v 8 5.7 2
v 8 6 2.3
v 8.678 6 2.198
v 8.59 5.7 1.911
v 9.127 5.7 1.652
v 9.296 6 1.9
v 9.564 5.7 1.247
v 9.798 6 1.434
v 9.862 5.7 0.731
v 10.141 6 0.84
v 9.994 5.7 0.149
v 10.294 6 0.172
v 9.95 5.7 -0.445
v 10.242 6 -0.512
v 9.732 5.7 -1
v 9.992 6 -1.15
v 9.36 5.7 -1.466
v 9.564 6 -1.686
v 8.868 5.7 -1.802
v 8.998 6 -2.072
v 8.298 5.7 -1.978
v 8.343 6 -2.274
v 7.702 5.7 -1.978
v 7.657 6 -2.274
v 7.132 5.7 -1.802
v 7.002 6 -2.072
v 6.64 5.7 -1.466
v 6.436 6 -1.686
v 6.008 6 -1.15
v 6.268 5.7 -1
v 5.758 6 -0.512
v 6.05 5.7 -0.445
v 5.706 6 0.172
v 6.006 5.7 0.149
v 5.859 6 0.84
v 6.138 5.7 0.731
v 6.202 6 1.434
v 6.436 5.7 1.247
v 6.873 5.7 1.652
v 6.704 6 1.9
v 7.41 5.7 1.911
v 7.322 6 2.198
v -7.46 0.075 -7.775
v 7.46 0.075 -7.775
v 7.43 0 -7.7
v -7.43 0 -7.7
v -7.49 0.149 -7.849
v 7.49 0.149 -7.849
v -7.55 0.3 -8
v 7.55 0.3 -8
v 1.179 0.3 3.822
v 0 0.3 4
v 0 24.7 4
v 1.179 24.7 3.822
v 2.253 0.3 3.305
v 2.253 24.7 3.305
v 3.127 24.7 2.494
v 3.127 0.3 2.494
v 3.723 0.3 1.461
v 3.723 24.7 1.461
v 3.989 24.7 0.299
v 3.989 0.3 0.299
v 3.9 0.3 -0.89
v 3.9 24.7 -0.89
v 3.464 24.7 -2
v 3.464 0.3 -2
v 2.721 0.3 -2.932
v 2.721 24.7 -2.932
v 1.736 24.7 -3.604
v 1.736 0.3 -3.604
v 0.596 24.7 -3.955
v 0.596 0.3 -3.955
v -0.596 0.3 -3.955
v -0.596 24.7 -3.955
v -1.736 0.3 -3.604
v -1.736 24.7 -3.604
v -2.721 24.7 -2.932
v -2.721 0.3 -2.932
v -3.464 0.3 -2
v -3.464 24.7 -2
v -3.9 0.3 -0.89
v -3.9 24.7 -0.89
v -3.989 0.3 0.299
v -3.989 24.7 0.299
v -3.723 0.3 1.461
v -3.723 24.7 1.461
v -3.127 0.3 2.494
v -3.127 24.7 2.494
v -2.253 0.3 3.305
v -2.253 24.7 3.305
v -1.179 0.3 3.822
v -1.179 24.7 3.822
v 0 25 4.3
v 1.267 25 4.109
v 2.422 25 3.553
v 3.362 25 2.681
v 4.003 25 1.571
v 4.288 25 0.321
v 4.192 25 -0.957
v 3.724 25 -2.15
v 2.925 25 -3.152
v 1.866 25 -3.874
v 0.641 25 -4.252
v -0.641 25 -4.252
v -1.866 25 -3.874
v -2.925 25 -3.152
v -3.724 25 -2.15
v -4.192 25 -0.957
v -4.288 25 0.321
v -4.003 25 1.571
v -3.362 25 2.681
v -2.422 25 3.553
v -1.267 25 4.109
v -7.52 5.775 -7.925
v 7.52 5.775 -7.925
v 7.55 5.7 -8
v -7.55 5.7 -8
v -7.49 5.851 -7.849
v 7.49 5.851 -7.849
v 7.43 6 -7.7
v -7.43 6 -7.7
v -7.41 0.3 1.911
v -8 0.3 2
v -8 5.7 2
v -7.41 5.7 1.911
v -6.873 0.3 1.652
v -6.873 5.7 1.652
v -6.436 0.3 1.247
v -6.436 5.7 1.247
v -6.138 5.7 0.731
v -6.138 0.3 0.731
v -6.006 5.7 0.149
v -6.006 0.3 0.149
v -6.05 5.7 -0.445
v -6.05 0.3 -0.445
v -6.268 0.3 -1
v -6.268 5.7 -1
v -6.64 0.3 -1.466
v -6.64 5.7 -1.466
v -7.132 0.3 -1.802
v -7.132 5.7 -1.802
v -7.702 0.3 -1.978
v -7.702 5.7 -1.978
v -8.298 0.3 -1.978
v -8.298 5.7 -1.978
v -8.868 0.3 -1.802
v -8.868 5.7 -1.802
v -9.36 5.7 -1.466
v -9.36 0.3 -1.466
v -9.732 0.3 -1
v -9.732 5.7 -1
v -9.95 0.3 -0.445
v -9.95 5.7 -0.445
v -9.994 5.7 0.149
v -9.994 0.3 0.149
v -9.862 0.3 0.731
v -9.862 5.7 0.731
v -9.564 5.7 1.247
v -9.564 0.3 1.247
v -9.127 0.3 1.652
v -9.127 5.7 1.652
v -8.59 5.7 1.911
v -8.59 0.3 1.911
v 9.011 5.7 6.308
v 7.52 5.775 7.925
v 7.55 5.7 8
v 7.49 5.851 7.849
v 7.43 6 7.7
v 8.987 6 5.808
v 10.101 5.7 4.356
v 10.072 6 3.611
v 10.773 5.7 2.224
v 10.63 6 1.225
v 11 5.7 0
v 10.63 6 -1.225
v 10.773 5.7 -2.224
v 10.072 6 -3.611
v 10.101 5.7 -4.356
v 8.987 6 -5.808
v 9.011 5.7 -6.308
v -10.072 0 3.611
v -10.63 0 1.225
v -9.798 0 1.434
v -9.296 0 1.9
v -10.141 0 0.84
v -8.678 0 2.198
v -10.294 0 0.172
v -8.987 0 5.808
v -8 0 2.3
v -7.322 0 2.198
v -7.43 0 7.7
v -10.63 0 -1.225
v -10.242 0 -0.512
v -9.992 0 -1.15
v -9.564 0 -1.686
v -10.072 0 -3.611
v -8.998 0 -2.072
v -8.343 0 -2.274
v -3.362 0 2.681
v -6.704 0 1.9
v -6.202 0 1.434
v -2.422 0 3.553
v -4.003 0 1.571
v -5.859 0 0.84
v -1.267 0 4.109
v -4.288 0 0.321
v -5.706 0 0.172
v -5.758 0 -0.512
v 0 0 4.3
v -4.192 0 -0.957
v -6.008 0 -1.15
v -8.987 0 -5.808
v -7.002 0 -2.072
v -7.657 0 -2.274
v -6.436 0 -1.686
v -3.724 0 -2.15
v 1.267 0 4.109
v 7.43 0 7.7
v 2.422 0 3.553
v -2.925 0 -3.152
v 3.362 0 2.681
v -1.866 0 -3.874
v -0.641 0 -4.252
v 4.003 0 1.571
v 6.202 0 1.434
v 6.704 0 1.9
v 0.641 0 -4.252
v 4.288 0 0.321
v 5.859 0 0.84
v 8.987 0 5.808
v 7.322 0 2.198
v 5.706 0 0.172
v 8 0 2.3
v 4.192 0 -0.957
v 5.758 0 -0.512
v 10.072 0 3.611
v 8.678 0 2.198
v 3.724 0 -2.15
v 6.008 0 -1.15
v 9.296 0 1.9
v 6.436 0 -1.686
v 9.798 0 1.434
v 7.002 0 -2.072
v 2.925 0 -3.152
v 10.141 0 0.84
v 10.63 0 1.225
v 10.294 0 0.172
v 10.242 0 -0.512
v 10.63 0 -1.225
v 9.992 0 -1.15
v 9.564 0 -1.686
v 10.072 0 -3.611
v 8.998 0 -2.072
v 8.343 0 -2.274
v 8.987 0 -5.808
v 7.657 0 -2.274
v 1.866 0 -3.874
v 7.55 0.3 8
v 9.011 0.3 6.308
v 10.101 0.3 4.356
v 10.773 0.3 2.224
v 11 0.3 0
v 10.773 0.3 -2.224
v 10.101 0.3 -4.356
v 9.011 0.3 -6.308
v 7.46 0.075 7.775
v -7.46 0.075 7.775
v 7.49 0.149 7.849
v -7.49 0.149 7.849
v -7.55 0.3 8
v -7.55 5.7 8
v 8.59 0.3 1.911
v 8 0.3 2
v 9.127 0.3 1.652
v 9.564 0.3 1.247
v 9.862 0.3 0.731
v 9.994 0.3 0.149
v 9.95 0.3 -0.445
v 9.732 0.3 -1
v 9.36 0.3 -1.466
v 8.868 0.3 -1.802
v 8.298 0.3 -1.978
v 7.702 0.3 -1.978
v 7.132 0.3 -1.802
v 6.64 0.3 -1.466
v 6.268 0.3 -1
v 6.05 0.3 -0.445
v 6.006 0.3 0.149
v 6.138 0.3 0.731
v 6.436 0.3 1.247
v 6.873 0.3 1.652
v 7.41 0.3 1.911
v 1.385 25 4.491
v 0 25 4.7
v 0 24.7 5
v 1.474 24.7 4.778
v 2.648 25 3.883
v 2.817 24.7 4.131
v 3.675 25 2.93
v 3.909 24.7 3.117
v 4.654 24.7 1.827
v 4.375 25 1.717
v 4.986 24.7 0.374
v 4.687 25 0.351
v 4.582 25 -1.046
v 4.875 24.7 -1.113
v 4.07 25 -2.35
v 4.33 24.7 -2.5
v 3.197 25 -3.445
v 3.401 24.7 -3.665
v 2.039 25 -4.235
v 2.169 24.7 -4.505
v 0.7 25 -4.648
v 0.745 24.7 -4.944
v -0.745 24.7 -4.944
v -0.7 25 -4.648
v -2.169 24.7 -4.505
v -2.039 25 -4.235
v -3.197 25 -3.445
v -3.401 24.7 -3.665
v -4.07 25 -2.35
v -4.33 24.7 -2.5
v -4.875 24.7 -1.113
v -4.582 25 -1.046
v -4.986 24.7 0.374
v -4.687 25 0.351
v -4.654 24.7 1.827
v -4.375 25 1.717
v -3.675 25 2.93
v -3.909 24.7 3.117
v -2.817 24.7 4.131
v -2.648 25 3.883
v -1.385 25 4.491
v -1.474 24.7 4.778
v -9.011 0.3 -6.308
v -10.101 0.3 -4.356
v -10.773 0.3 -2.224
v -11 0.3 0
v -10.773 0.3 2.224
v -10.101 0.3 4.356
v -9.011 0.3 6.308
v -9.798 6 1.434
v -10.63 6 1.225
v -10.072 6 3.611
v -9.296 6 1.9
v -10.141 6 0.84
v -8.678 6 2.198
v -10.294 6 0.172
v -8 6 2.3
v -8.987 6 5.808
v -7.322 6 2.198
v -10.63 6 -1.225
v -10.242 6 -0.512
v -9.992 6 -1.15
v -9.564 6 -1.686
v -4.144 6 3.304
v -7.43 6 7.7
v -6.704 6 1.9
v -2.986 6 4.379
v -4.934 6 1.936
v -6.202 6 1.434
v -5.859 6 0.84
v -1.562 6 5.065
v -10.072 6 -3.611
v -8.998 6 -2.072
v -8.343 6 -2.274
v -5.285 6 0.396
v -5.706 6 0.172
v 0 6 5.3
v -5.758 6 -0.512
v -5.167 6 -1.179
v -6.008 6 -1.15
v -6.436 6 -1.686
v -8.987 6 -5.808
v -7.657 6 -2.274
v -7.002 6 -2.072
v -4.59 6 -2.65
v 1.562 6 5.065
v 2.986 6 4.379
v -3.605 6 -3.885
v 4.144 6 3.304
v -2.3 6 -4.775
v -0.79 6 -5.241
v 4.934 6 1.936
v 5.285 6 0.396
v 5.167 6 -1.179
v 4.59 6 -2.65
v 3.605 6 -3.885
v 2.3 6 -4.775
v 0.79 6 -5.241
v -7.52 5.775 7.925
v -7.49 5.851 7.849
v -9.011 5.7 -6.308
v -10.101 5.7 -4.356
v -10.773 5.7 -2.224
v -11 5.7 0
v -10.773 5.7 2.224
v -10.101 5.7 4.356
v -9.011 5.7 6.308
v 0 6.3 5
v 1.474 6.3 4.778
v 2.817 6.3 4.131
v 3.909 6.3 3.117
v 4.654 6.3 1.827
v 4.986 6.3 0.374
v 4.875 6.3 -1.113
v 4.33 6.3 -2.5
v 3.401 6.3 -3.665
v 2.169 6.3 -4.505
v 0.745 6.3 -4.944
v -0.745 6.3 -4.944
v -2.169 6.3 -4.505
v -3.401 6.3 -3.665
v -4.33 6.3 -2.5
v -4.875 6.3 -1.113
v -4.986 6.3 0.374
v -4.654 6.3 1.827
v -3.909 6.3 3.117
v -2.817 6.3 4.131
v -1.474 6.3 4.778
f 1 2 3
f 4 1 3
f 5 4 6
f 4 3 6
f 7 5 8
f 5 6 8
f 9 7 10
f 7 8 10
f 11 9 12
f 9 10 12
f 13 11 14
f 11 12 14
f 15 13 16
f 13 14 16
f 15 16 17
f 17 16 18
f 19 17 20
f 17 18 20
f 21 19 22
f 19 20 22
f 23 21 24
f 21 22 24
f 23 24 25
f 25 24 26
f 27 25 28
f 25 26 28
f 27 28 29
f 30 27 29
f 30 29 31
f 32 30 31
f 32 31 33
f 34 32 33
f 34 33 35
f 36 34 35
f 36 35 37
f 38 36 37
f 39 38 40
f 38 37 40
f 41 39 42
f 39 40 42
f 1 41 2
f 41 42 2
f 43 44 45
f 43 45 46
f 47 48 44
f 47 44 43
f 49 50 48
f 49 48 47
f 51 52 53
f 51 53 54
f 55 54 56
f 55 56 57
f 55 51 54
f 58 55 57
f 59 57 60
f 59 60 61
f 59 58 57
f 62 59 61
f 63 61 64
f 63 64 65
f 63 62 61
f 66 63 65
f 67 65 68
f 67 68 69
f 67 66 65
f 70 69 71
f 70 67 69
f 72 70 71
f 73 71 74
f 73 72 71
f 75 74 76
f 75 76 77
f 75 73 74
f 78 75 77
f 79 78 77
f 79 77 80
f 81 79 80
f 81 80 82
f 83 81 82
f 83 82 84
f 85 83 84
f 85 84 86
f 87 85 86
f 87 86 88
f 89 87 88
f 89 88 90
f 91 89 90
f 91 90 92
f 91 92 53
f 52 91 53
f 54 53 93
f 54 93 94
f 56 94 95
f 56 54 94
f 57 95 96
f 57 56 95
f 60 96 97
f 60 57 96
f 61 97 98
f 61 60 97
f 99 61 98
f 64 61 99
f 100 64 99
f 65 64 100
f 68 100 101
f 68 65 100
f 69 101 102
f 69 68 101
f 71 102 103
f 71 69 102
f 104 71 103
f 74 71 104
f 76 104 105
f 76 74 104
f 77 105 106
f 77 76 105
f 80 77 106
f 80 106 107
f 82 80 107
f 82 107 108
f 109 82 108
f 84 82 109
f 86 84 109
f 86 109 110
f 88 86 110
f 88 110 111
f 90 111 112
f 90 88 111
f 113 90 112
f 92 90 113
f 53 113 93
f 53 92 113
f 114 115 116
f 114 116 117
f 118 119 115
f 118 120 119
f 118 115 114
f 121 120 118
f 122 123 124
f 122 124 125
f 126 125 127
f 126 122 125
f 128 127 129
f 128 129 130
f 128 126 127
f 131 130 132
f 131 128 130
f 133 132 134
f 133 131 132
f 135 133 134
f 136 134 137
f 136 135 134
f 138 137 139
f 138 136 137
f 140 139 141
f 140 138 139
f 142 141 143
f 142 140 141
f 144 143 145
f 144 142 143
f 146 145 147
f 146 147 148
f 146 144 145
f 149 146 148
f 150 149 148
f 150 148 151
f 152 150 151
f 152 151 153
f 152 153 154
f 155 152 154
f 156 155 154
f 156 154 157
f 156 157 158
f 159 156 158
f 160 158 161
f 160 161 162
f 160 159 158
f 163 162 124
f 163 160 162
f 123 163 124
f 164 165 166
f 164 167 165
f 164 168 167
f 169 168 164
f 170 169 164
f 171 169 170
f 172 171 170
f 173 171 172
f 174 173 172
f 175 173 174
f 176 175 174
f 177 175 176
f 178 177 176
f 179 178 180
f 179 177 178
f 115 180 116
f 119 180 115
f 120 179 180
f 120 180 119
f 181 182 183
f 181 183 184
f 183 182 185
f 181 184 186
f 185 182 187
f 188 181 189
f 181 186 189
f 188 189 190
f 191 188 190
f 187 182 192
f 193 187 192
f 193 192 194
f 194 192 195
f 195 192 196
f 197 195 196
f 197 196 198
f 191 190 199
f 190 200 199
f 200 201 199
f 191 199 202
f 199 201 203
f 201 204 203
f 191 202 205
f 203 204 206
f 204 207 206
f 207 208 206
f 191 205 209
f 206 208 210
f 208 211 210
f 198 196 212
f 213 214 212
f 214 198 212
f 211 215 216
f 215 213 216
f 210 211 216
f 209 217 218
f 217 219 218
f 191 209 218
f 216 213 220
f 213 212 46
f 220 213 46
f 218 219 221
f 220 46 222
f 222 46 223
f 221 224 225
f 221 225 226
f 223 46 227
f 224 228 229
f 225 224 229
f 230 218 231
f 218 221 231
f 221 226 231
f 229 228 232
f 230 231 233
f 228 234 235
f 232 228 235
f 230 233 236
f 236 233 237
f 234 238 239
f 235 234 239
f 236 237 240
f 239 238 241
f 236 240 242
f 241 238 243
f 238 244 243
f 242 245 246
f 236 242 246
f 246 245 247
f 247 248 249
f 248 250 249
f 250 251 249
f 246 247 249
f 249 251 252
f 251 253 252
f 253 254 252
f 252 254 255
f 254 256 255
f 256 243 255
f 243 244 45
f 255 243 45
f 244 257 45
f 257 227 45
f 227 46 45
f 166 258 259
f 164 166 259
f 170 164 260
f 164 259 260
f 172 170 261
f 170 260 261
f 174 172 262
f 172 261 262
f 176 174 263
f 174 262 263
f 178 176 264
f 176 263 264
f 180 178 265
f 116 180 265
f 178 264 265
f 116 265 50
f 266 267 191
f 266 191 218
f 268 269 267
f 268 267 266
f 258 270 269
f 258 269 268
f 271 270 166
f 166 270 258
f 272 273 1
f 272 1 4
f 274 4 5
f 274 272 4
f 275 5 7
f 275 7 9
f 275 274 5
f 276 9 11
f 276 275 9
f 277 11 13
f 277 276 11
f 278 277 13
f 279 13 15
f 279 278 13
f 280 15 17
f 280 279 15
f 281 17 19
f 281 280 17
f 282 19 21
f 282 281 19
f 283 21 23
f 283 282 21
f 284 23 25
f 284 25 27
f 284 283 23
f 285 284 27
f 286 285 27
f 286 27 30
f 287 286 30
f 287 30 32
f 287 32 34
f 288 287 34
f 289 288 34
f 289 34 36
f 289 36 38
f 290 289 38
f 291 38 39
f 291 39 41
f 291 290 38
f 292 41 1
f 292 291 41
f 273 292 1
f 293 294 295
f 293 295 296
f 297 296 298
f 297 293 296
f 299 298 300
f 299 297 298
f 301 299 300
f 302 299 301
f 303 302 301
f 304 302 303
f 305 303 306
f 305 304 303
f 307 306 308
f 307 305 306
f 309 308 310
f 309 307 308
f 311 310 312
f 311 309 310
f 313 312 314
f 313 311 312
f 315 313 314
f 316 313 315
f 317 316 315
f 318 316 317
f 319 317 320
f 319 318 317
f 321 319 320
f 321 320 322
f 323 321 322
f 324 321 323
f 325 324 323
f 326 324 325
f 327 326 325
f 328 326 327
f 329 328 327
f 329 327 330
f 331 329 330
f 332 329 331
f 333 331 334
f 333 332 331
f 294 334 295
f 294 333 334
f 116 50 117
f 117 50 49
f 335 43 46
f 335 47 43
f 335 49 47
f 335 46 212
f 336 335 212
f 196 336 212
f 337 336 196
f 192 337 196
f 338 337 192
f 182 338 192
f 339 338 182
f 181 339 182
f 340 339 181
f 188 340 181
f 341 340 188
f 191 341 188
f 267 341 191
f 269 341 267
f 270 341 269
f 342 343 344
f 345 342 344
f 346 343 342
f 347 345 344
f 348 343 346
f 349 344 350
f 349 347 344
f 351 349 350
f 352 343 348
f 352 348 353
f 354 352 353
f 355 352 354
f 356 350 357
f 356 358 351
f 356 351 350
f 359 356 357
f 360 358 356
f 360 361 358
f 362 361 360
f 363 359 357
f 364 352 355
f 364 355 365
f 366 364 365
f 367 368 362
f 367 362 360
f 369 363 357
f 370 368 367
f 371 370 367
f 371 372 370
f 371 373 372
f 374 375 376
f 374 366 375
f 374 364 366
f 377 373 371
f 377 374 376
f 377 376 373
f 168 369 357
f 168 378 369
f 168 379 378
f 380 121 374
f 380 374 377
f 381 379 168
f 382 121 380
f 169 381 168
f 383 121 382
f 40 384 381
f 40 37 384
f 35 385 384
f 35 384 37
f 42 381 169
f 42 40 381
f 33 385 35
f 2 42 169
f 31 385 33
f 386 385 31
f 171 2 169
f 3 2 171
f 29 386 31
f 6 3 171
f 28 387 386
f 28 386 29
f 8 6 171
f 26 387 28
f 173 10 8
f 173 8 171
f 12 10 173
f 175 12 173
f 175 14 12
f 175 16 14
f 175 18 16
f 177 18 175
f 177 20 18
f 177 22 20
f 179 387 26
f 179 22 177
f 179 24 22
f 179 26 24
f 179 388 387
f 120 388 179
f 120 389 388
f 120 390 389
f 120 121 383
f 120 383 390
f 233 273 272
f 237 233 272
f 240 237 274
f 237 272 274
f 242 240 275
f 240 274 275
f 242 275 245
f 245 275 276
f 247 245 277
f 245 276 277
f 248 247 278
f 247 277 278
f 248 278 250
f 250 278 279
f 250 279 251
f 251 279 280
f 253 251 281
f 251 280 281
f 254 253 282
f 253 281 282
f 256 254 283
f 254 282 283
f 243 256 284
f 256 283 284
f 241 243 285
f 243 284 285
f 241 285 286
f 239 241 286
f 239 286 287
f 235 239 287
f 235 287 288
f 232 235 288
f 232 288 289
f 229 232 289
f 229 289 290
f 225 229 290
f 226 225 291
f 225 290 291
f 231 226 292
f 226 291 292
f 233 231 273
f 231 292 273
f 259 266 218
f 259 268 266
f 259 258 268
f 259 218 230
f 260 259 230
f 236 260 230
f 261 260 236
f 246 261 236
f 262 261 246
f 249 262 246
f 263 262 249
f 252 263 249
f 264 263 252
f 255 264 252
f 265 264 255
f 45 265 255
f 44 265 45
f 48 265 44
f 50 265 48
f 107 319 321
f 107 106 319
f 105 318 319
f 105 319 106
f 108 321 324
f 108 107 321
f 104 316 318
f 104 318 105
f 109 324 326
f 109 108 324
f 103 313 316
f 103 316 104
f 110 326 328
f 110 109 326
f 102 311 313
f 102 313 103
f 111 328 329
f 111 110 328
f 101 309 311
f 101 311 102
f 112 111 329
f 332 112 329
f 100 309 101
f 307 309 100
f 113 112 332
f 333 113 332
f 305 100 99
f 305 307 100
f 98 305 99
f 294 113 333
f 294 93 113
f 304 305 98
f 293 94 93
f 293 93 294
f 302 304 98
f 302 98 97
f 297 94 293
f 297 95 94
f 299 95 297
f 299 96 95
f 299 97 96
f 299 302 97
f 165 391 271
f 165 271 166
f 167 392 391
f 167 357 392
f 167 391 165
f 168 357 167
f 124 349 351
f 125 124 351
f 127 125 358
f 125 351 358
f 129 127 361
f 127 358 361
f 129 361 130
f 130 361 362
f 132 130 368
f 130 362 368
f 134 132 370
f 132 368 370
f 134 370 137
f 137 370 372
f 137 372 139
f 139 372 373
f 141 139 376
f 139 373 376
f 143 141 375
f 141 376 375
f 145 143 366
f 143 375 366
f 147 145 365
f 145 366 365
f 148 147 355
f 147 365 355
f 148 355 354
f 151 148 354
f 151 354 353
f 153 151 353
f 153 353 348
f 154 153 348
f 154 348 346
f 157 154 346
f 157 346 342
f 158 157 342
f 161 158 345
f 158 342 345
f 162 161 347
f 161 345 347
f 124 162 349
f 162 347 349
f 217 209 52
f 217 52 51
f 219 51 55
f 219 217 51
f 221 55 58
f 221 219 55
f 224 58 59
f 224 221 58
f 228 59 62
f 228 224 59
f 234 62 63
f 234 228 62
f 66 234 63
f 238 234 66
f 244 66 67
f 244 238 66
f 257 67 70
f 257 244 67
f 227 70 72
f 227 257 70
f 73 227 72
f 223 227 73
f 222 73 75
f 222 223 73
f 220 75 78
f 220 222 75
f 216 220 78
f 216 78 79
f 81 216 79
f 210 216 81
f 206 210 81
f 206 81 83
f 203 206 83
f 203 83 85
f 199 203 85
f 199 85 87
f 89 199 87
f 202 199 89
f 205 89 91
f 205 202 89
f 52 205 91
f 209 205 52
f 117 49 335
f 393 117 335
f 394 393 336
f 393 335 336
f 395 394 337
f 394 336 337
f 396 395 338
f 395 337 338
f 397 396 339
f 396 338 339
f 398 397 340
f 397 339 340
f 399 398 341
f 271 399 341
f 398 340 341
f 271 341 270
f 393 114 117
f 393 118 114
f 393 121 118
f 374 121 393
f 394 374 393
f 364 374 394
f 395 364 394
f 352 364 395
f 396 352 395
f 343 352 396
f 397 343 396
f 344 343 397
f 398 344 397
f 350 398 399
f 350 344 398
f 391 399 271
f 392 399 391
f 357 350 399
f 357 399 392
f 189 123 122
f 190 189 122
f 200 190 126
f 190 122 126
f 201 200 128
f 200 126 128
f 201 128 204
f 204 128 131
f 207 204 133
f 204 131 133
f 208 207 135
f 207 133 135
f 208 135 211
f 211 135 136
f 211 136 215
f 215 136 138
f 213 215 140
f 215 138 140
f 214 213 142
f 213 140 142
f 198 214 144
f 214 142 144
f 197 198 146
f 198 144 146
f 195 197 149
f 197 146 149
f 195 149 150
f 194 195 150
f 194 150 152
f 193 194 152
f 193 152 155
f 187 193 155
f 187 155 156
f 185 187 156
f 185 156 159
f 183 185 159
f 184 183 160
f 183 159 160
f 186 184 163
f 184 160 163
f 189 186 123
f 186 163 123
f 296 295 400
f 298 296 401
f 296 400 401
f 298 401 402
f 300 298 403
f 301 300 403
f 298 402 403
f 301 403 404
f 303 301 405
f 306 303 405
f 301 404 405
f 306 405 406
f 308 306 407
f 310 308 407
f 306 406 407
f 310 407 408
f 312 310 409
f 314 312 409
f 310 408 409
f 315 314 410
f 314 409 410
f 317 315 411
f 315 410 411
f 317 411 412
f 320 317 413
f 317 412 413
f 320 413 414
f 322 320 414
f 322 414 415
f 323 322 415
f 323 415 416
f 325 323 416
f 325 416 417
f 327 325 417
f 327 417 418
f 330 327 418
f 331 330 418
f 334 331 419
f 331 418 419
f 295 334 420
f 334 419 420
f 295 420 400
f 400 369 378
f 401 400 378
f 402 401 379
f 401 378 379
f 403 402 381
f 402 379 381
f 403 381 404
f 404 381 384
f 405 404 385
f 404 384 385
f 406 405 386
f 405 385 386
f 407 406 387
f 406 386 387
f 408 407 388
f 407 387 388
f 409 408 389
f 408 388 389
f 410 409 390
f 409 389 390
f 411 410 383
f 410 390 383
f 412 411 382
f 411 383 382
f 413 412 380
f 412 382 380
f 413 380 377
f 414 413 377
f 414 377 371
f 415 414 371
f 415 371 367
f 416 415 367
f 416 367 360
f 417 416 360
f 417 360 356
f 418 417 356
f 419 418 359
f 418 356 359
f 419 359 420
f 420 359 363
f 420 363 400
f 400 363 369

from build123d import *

# Parameters (mm, degrees)
CROQUIS1_R              = 4
CROQUIS1_R_2            = 2
SALIENTE_EXTRUIR1_DEPTH = 6
CROQUIS2_R              = 5
CROQUIS2_R_2            = 4
SALIENTE_EXTRUIR2_DEPTH = 19
CHAFL_N1_SIZE           = 0.3


with BuildPart() as part:
    # Croquis1 → Saliente-Extruir1 (new body)
    with BuildSketch(Plane(origin=(0, 0, 0), x_dir=(1, 0, 0), z_dir=(0, 1, 0))):
        with BuildLine():
            Line((7.549834435, 8), (-7.549834435, 8))
            ThreePointArc((-7.549834435, 8), (-11, 0), (-7.549834435, -8))
            Line((-7.549834435, -8), (7.549834435, -8))
            ThreePointArc((7.549834435, -8), (11, 0), (7.549834435, 8))
        make_face()
        with Locations(Location((0, 0, 0), (0, 0, 270))):
            Circle(CROQUIS1_R, mode=Mode.SUBTRACT)
        with Locations(Location((-8, 0, 0), (0, 0, 270))):
            Circle(CROQUIS1_R_2, mode=Mode.SUBTRACT)
        with Locations(Location((8, 0, 0), (0, 0, 270))):
            Circle(CROQUIS1_R_2, mode=Mode.SUBTRACT)
    extrude(amount=SALIENTE_EXTRUIR1_DEPTH)

    # Croquis2 → Saliente-Extruir2 (add)
    with BuildSketch(Plane(origin=(0, 6, 0), x_dir=(1, 0, 0), z_dir=(0, 1, 0))):
        with Locations(Location((0, 0, 0), (0, 0, 270))):
            Circle(CROQUIS2_R)
        with Locations(Location((0, 0, 0), (0, 0, 270))):
            Circle(CROQUIS2_R_2, mode=Mode.SUBTRACT)
    extrude(amount=SALIENTE_EXTRUIR2_DEPTH)

    # Chaflán1
    chafl_n1_edges = [part.edges().sort_by_distance(p)[0] for p in [
        (-11, 6, 0),
        (0, 0, -4),
        (0, 6, 8),
        (-8, 0, -2),
        (-8, 6, -2),
        (8, 0, -2),
        (8, 6, -2),
        (0, 25, -5),
        (0, 6, -5),
        (0, 25, -4),
        (11, 6, 0),
        (0, 0, 8),
        (-11, 0, 0),
        (0, 0, -8),
        (11, 0, 0),
        (0, 6, -8),
    ]]
    chamfer(chafl_n1_edges, length=CHAFL_N1_SIZE)


solid = part.part
